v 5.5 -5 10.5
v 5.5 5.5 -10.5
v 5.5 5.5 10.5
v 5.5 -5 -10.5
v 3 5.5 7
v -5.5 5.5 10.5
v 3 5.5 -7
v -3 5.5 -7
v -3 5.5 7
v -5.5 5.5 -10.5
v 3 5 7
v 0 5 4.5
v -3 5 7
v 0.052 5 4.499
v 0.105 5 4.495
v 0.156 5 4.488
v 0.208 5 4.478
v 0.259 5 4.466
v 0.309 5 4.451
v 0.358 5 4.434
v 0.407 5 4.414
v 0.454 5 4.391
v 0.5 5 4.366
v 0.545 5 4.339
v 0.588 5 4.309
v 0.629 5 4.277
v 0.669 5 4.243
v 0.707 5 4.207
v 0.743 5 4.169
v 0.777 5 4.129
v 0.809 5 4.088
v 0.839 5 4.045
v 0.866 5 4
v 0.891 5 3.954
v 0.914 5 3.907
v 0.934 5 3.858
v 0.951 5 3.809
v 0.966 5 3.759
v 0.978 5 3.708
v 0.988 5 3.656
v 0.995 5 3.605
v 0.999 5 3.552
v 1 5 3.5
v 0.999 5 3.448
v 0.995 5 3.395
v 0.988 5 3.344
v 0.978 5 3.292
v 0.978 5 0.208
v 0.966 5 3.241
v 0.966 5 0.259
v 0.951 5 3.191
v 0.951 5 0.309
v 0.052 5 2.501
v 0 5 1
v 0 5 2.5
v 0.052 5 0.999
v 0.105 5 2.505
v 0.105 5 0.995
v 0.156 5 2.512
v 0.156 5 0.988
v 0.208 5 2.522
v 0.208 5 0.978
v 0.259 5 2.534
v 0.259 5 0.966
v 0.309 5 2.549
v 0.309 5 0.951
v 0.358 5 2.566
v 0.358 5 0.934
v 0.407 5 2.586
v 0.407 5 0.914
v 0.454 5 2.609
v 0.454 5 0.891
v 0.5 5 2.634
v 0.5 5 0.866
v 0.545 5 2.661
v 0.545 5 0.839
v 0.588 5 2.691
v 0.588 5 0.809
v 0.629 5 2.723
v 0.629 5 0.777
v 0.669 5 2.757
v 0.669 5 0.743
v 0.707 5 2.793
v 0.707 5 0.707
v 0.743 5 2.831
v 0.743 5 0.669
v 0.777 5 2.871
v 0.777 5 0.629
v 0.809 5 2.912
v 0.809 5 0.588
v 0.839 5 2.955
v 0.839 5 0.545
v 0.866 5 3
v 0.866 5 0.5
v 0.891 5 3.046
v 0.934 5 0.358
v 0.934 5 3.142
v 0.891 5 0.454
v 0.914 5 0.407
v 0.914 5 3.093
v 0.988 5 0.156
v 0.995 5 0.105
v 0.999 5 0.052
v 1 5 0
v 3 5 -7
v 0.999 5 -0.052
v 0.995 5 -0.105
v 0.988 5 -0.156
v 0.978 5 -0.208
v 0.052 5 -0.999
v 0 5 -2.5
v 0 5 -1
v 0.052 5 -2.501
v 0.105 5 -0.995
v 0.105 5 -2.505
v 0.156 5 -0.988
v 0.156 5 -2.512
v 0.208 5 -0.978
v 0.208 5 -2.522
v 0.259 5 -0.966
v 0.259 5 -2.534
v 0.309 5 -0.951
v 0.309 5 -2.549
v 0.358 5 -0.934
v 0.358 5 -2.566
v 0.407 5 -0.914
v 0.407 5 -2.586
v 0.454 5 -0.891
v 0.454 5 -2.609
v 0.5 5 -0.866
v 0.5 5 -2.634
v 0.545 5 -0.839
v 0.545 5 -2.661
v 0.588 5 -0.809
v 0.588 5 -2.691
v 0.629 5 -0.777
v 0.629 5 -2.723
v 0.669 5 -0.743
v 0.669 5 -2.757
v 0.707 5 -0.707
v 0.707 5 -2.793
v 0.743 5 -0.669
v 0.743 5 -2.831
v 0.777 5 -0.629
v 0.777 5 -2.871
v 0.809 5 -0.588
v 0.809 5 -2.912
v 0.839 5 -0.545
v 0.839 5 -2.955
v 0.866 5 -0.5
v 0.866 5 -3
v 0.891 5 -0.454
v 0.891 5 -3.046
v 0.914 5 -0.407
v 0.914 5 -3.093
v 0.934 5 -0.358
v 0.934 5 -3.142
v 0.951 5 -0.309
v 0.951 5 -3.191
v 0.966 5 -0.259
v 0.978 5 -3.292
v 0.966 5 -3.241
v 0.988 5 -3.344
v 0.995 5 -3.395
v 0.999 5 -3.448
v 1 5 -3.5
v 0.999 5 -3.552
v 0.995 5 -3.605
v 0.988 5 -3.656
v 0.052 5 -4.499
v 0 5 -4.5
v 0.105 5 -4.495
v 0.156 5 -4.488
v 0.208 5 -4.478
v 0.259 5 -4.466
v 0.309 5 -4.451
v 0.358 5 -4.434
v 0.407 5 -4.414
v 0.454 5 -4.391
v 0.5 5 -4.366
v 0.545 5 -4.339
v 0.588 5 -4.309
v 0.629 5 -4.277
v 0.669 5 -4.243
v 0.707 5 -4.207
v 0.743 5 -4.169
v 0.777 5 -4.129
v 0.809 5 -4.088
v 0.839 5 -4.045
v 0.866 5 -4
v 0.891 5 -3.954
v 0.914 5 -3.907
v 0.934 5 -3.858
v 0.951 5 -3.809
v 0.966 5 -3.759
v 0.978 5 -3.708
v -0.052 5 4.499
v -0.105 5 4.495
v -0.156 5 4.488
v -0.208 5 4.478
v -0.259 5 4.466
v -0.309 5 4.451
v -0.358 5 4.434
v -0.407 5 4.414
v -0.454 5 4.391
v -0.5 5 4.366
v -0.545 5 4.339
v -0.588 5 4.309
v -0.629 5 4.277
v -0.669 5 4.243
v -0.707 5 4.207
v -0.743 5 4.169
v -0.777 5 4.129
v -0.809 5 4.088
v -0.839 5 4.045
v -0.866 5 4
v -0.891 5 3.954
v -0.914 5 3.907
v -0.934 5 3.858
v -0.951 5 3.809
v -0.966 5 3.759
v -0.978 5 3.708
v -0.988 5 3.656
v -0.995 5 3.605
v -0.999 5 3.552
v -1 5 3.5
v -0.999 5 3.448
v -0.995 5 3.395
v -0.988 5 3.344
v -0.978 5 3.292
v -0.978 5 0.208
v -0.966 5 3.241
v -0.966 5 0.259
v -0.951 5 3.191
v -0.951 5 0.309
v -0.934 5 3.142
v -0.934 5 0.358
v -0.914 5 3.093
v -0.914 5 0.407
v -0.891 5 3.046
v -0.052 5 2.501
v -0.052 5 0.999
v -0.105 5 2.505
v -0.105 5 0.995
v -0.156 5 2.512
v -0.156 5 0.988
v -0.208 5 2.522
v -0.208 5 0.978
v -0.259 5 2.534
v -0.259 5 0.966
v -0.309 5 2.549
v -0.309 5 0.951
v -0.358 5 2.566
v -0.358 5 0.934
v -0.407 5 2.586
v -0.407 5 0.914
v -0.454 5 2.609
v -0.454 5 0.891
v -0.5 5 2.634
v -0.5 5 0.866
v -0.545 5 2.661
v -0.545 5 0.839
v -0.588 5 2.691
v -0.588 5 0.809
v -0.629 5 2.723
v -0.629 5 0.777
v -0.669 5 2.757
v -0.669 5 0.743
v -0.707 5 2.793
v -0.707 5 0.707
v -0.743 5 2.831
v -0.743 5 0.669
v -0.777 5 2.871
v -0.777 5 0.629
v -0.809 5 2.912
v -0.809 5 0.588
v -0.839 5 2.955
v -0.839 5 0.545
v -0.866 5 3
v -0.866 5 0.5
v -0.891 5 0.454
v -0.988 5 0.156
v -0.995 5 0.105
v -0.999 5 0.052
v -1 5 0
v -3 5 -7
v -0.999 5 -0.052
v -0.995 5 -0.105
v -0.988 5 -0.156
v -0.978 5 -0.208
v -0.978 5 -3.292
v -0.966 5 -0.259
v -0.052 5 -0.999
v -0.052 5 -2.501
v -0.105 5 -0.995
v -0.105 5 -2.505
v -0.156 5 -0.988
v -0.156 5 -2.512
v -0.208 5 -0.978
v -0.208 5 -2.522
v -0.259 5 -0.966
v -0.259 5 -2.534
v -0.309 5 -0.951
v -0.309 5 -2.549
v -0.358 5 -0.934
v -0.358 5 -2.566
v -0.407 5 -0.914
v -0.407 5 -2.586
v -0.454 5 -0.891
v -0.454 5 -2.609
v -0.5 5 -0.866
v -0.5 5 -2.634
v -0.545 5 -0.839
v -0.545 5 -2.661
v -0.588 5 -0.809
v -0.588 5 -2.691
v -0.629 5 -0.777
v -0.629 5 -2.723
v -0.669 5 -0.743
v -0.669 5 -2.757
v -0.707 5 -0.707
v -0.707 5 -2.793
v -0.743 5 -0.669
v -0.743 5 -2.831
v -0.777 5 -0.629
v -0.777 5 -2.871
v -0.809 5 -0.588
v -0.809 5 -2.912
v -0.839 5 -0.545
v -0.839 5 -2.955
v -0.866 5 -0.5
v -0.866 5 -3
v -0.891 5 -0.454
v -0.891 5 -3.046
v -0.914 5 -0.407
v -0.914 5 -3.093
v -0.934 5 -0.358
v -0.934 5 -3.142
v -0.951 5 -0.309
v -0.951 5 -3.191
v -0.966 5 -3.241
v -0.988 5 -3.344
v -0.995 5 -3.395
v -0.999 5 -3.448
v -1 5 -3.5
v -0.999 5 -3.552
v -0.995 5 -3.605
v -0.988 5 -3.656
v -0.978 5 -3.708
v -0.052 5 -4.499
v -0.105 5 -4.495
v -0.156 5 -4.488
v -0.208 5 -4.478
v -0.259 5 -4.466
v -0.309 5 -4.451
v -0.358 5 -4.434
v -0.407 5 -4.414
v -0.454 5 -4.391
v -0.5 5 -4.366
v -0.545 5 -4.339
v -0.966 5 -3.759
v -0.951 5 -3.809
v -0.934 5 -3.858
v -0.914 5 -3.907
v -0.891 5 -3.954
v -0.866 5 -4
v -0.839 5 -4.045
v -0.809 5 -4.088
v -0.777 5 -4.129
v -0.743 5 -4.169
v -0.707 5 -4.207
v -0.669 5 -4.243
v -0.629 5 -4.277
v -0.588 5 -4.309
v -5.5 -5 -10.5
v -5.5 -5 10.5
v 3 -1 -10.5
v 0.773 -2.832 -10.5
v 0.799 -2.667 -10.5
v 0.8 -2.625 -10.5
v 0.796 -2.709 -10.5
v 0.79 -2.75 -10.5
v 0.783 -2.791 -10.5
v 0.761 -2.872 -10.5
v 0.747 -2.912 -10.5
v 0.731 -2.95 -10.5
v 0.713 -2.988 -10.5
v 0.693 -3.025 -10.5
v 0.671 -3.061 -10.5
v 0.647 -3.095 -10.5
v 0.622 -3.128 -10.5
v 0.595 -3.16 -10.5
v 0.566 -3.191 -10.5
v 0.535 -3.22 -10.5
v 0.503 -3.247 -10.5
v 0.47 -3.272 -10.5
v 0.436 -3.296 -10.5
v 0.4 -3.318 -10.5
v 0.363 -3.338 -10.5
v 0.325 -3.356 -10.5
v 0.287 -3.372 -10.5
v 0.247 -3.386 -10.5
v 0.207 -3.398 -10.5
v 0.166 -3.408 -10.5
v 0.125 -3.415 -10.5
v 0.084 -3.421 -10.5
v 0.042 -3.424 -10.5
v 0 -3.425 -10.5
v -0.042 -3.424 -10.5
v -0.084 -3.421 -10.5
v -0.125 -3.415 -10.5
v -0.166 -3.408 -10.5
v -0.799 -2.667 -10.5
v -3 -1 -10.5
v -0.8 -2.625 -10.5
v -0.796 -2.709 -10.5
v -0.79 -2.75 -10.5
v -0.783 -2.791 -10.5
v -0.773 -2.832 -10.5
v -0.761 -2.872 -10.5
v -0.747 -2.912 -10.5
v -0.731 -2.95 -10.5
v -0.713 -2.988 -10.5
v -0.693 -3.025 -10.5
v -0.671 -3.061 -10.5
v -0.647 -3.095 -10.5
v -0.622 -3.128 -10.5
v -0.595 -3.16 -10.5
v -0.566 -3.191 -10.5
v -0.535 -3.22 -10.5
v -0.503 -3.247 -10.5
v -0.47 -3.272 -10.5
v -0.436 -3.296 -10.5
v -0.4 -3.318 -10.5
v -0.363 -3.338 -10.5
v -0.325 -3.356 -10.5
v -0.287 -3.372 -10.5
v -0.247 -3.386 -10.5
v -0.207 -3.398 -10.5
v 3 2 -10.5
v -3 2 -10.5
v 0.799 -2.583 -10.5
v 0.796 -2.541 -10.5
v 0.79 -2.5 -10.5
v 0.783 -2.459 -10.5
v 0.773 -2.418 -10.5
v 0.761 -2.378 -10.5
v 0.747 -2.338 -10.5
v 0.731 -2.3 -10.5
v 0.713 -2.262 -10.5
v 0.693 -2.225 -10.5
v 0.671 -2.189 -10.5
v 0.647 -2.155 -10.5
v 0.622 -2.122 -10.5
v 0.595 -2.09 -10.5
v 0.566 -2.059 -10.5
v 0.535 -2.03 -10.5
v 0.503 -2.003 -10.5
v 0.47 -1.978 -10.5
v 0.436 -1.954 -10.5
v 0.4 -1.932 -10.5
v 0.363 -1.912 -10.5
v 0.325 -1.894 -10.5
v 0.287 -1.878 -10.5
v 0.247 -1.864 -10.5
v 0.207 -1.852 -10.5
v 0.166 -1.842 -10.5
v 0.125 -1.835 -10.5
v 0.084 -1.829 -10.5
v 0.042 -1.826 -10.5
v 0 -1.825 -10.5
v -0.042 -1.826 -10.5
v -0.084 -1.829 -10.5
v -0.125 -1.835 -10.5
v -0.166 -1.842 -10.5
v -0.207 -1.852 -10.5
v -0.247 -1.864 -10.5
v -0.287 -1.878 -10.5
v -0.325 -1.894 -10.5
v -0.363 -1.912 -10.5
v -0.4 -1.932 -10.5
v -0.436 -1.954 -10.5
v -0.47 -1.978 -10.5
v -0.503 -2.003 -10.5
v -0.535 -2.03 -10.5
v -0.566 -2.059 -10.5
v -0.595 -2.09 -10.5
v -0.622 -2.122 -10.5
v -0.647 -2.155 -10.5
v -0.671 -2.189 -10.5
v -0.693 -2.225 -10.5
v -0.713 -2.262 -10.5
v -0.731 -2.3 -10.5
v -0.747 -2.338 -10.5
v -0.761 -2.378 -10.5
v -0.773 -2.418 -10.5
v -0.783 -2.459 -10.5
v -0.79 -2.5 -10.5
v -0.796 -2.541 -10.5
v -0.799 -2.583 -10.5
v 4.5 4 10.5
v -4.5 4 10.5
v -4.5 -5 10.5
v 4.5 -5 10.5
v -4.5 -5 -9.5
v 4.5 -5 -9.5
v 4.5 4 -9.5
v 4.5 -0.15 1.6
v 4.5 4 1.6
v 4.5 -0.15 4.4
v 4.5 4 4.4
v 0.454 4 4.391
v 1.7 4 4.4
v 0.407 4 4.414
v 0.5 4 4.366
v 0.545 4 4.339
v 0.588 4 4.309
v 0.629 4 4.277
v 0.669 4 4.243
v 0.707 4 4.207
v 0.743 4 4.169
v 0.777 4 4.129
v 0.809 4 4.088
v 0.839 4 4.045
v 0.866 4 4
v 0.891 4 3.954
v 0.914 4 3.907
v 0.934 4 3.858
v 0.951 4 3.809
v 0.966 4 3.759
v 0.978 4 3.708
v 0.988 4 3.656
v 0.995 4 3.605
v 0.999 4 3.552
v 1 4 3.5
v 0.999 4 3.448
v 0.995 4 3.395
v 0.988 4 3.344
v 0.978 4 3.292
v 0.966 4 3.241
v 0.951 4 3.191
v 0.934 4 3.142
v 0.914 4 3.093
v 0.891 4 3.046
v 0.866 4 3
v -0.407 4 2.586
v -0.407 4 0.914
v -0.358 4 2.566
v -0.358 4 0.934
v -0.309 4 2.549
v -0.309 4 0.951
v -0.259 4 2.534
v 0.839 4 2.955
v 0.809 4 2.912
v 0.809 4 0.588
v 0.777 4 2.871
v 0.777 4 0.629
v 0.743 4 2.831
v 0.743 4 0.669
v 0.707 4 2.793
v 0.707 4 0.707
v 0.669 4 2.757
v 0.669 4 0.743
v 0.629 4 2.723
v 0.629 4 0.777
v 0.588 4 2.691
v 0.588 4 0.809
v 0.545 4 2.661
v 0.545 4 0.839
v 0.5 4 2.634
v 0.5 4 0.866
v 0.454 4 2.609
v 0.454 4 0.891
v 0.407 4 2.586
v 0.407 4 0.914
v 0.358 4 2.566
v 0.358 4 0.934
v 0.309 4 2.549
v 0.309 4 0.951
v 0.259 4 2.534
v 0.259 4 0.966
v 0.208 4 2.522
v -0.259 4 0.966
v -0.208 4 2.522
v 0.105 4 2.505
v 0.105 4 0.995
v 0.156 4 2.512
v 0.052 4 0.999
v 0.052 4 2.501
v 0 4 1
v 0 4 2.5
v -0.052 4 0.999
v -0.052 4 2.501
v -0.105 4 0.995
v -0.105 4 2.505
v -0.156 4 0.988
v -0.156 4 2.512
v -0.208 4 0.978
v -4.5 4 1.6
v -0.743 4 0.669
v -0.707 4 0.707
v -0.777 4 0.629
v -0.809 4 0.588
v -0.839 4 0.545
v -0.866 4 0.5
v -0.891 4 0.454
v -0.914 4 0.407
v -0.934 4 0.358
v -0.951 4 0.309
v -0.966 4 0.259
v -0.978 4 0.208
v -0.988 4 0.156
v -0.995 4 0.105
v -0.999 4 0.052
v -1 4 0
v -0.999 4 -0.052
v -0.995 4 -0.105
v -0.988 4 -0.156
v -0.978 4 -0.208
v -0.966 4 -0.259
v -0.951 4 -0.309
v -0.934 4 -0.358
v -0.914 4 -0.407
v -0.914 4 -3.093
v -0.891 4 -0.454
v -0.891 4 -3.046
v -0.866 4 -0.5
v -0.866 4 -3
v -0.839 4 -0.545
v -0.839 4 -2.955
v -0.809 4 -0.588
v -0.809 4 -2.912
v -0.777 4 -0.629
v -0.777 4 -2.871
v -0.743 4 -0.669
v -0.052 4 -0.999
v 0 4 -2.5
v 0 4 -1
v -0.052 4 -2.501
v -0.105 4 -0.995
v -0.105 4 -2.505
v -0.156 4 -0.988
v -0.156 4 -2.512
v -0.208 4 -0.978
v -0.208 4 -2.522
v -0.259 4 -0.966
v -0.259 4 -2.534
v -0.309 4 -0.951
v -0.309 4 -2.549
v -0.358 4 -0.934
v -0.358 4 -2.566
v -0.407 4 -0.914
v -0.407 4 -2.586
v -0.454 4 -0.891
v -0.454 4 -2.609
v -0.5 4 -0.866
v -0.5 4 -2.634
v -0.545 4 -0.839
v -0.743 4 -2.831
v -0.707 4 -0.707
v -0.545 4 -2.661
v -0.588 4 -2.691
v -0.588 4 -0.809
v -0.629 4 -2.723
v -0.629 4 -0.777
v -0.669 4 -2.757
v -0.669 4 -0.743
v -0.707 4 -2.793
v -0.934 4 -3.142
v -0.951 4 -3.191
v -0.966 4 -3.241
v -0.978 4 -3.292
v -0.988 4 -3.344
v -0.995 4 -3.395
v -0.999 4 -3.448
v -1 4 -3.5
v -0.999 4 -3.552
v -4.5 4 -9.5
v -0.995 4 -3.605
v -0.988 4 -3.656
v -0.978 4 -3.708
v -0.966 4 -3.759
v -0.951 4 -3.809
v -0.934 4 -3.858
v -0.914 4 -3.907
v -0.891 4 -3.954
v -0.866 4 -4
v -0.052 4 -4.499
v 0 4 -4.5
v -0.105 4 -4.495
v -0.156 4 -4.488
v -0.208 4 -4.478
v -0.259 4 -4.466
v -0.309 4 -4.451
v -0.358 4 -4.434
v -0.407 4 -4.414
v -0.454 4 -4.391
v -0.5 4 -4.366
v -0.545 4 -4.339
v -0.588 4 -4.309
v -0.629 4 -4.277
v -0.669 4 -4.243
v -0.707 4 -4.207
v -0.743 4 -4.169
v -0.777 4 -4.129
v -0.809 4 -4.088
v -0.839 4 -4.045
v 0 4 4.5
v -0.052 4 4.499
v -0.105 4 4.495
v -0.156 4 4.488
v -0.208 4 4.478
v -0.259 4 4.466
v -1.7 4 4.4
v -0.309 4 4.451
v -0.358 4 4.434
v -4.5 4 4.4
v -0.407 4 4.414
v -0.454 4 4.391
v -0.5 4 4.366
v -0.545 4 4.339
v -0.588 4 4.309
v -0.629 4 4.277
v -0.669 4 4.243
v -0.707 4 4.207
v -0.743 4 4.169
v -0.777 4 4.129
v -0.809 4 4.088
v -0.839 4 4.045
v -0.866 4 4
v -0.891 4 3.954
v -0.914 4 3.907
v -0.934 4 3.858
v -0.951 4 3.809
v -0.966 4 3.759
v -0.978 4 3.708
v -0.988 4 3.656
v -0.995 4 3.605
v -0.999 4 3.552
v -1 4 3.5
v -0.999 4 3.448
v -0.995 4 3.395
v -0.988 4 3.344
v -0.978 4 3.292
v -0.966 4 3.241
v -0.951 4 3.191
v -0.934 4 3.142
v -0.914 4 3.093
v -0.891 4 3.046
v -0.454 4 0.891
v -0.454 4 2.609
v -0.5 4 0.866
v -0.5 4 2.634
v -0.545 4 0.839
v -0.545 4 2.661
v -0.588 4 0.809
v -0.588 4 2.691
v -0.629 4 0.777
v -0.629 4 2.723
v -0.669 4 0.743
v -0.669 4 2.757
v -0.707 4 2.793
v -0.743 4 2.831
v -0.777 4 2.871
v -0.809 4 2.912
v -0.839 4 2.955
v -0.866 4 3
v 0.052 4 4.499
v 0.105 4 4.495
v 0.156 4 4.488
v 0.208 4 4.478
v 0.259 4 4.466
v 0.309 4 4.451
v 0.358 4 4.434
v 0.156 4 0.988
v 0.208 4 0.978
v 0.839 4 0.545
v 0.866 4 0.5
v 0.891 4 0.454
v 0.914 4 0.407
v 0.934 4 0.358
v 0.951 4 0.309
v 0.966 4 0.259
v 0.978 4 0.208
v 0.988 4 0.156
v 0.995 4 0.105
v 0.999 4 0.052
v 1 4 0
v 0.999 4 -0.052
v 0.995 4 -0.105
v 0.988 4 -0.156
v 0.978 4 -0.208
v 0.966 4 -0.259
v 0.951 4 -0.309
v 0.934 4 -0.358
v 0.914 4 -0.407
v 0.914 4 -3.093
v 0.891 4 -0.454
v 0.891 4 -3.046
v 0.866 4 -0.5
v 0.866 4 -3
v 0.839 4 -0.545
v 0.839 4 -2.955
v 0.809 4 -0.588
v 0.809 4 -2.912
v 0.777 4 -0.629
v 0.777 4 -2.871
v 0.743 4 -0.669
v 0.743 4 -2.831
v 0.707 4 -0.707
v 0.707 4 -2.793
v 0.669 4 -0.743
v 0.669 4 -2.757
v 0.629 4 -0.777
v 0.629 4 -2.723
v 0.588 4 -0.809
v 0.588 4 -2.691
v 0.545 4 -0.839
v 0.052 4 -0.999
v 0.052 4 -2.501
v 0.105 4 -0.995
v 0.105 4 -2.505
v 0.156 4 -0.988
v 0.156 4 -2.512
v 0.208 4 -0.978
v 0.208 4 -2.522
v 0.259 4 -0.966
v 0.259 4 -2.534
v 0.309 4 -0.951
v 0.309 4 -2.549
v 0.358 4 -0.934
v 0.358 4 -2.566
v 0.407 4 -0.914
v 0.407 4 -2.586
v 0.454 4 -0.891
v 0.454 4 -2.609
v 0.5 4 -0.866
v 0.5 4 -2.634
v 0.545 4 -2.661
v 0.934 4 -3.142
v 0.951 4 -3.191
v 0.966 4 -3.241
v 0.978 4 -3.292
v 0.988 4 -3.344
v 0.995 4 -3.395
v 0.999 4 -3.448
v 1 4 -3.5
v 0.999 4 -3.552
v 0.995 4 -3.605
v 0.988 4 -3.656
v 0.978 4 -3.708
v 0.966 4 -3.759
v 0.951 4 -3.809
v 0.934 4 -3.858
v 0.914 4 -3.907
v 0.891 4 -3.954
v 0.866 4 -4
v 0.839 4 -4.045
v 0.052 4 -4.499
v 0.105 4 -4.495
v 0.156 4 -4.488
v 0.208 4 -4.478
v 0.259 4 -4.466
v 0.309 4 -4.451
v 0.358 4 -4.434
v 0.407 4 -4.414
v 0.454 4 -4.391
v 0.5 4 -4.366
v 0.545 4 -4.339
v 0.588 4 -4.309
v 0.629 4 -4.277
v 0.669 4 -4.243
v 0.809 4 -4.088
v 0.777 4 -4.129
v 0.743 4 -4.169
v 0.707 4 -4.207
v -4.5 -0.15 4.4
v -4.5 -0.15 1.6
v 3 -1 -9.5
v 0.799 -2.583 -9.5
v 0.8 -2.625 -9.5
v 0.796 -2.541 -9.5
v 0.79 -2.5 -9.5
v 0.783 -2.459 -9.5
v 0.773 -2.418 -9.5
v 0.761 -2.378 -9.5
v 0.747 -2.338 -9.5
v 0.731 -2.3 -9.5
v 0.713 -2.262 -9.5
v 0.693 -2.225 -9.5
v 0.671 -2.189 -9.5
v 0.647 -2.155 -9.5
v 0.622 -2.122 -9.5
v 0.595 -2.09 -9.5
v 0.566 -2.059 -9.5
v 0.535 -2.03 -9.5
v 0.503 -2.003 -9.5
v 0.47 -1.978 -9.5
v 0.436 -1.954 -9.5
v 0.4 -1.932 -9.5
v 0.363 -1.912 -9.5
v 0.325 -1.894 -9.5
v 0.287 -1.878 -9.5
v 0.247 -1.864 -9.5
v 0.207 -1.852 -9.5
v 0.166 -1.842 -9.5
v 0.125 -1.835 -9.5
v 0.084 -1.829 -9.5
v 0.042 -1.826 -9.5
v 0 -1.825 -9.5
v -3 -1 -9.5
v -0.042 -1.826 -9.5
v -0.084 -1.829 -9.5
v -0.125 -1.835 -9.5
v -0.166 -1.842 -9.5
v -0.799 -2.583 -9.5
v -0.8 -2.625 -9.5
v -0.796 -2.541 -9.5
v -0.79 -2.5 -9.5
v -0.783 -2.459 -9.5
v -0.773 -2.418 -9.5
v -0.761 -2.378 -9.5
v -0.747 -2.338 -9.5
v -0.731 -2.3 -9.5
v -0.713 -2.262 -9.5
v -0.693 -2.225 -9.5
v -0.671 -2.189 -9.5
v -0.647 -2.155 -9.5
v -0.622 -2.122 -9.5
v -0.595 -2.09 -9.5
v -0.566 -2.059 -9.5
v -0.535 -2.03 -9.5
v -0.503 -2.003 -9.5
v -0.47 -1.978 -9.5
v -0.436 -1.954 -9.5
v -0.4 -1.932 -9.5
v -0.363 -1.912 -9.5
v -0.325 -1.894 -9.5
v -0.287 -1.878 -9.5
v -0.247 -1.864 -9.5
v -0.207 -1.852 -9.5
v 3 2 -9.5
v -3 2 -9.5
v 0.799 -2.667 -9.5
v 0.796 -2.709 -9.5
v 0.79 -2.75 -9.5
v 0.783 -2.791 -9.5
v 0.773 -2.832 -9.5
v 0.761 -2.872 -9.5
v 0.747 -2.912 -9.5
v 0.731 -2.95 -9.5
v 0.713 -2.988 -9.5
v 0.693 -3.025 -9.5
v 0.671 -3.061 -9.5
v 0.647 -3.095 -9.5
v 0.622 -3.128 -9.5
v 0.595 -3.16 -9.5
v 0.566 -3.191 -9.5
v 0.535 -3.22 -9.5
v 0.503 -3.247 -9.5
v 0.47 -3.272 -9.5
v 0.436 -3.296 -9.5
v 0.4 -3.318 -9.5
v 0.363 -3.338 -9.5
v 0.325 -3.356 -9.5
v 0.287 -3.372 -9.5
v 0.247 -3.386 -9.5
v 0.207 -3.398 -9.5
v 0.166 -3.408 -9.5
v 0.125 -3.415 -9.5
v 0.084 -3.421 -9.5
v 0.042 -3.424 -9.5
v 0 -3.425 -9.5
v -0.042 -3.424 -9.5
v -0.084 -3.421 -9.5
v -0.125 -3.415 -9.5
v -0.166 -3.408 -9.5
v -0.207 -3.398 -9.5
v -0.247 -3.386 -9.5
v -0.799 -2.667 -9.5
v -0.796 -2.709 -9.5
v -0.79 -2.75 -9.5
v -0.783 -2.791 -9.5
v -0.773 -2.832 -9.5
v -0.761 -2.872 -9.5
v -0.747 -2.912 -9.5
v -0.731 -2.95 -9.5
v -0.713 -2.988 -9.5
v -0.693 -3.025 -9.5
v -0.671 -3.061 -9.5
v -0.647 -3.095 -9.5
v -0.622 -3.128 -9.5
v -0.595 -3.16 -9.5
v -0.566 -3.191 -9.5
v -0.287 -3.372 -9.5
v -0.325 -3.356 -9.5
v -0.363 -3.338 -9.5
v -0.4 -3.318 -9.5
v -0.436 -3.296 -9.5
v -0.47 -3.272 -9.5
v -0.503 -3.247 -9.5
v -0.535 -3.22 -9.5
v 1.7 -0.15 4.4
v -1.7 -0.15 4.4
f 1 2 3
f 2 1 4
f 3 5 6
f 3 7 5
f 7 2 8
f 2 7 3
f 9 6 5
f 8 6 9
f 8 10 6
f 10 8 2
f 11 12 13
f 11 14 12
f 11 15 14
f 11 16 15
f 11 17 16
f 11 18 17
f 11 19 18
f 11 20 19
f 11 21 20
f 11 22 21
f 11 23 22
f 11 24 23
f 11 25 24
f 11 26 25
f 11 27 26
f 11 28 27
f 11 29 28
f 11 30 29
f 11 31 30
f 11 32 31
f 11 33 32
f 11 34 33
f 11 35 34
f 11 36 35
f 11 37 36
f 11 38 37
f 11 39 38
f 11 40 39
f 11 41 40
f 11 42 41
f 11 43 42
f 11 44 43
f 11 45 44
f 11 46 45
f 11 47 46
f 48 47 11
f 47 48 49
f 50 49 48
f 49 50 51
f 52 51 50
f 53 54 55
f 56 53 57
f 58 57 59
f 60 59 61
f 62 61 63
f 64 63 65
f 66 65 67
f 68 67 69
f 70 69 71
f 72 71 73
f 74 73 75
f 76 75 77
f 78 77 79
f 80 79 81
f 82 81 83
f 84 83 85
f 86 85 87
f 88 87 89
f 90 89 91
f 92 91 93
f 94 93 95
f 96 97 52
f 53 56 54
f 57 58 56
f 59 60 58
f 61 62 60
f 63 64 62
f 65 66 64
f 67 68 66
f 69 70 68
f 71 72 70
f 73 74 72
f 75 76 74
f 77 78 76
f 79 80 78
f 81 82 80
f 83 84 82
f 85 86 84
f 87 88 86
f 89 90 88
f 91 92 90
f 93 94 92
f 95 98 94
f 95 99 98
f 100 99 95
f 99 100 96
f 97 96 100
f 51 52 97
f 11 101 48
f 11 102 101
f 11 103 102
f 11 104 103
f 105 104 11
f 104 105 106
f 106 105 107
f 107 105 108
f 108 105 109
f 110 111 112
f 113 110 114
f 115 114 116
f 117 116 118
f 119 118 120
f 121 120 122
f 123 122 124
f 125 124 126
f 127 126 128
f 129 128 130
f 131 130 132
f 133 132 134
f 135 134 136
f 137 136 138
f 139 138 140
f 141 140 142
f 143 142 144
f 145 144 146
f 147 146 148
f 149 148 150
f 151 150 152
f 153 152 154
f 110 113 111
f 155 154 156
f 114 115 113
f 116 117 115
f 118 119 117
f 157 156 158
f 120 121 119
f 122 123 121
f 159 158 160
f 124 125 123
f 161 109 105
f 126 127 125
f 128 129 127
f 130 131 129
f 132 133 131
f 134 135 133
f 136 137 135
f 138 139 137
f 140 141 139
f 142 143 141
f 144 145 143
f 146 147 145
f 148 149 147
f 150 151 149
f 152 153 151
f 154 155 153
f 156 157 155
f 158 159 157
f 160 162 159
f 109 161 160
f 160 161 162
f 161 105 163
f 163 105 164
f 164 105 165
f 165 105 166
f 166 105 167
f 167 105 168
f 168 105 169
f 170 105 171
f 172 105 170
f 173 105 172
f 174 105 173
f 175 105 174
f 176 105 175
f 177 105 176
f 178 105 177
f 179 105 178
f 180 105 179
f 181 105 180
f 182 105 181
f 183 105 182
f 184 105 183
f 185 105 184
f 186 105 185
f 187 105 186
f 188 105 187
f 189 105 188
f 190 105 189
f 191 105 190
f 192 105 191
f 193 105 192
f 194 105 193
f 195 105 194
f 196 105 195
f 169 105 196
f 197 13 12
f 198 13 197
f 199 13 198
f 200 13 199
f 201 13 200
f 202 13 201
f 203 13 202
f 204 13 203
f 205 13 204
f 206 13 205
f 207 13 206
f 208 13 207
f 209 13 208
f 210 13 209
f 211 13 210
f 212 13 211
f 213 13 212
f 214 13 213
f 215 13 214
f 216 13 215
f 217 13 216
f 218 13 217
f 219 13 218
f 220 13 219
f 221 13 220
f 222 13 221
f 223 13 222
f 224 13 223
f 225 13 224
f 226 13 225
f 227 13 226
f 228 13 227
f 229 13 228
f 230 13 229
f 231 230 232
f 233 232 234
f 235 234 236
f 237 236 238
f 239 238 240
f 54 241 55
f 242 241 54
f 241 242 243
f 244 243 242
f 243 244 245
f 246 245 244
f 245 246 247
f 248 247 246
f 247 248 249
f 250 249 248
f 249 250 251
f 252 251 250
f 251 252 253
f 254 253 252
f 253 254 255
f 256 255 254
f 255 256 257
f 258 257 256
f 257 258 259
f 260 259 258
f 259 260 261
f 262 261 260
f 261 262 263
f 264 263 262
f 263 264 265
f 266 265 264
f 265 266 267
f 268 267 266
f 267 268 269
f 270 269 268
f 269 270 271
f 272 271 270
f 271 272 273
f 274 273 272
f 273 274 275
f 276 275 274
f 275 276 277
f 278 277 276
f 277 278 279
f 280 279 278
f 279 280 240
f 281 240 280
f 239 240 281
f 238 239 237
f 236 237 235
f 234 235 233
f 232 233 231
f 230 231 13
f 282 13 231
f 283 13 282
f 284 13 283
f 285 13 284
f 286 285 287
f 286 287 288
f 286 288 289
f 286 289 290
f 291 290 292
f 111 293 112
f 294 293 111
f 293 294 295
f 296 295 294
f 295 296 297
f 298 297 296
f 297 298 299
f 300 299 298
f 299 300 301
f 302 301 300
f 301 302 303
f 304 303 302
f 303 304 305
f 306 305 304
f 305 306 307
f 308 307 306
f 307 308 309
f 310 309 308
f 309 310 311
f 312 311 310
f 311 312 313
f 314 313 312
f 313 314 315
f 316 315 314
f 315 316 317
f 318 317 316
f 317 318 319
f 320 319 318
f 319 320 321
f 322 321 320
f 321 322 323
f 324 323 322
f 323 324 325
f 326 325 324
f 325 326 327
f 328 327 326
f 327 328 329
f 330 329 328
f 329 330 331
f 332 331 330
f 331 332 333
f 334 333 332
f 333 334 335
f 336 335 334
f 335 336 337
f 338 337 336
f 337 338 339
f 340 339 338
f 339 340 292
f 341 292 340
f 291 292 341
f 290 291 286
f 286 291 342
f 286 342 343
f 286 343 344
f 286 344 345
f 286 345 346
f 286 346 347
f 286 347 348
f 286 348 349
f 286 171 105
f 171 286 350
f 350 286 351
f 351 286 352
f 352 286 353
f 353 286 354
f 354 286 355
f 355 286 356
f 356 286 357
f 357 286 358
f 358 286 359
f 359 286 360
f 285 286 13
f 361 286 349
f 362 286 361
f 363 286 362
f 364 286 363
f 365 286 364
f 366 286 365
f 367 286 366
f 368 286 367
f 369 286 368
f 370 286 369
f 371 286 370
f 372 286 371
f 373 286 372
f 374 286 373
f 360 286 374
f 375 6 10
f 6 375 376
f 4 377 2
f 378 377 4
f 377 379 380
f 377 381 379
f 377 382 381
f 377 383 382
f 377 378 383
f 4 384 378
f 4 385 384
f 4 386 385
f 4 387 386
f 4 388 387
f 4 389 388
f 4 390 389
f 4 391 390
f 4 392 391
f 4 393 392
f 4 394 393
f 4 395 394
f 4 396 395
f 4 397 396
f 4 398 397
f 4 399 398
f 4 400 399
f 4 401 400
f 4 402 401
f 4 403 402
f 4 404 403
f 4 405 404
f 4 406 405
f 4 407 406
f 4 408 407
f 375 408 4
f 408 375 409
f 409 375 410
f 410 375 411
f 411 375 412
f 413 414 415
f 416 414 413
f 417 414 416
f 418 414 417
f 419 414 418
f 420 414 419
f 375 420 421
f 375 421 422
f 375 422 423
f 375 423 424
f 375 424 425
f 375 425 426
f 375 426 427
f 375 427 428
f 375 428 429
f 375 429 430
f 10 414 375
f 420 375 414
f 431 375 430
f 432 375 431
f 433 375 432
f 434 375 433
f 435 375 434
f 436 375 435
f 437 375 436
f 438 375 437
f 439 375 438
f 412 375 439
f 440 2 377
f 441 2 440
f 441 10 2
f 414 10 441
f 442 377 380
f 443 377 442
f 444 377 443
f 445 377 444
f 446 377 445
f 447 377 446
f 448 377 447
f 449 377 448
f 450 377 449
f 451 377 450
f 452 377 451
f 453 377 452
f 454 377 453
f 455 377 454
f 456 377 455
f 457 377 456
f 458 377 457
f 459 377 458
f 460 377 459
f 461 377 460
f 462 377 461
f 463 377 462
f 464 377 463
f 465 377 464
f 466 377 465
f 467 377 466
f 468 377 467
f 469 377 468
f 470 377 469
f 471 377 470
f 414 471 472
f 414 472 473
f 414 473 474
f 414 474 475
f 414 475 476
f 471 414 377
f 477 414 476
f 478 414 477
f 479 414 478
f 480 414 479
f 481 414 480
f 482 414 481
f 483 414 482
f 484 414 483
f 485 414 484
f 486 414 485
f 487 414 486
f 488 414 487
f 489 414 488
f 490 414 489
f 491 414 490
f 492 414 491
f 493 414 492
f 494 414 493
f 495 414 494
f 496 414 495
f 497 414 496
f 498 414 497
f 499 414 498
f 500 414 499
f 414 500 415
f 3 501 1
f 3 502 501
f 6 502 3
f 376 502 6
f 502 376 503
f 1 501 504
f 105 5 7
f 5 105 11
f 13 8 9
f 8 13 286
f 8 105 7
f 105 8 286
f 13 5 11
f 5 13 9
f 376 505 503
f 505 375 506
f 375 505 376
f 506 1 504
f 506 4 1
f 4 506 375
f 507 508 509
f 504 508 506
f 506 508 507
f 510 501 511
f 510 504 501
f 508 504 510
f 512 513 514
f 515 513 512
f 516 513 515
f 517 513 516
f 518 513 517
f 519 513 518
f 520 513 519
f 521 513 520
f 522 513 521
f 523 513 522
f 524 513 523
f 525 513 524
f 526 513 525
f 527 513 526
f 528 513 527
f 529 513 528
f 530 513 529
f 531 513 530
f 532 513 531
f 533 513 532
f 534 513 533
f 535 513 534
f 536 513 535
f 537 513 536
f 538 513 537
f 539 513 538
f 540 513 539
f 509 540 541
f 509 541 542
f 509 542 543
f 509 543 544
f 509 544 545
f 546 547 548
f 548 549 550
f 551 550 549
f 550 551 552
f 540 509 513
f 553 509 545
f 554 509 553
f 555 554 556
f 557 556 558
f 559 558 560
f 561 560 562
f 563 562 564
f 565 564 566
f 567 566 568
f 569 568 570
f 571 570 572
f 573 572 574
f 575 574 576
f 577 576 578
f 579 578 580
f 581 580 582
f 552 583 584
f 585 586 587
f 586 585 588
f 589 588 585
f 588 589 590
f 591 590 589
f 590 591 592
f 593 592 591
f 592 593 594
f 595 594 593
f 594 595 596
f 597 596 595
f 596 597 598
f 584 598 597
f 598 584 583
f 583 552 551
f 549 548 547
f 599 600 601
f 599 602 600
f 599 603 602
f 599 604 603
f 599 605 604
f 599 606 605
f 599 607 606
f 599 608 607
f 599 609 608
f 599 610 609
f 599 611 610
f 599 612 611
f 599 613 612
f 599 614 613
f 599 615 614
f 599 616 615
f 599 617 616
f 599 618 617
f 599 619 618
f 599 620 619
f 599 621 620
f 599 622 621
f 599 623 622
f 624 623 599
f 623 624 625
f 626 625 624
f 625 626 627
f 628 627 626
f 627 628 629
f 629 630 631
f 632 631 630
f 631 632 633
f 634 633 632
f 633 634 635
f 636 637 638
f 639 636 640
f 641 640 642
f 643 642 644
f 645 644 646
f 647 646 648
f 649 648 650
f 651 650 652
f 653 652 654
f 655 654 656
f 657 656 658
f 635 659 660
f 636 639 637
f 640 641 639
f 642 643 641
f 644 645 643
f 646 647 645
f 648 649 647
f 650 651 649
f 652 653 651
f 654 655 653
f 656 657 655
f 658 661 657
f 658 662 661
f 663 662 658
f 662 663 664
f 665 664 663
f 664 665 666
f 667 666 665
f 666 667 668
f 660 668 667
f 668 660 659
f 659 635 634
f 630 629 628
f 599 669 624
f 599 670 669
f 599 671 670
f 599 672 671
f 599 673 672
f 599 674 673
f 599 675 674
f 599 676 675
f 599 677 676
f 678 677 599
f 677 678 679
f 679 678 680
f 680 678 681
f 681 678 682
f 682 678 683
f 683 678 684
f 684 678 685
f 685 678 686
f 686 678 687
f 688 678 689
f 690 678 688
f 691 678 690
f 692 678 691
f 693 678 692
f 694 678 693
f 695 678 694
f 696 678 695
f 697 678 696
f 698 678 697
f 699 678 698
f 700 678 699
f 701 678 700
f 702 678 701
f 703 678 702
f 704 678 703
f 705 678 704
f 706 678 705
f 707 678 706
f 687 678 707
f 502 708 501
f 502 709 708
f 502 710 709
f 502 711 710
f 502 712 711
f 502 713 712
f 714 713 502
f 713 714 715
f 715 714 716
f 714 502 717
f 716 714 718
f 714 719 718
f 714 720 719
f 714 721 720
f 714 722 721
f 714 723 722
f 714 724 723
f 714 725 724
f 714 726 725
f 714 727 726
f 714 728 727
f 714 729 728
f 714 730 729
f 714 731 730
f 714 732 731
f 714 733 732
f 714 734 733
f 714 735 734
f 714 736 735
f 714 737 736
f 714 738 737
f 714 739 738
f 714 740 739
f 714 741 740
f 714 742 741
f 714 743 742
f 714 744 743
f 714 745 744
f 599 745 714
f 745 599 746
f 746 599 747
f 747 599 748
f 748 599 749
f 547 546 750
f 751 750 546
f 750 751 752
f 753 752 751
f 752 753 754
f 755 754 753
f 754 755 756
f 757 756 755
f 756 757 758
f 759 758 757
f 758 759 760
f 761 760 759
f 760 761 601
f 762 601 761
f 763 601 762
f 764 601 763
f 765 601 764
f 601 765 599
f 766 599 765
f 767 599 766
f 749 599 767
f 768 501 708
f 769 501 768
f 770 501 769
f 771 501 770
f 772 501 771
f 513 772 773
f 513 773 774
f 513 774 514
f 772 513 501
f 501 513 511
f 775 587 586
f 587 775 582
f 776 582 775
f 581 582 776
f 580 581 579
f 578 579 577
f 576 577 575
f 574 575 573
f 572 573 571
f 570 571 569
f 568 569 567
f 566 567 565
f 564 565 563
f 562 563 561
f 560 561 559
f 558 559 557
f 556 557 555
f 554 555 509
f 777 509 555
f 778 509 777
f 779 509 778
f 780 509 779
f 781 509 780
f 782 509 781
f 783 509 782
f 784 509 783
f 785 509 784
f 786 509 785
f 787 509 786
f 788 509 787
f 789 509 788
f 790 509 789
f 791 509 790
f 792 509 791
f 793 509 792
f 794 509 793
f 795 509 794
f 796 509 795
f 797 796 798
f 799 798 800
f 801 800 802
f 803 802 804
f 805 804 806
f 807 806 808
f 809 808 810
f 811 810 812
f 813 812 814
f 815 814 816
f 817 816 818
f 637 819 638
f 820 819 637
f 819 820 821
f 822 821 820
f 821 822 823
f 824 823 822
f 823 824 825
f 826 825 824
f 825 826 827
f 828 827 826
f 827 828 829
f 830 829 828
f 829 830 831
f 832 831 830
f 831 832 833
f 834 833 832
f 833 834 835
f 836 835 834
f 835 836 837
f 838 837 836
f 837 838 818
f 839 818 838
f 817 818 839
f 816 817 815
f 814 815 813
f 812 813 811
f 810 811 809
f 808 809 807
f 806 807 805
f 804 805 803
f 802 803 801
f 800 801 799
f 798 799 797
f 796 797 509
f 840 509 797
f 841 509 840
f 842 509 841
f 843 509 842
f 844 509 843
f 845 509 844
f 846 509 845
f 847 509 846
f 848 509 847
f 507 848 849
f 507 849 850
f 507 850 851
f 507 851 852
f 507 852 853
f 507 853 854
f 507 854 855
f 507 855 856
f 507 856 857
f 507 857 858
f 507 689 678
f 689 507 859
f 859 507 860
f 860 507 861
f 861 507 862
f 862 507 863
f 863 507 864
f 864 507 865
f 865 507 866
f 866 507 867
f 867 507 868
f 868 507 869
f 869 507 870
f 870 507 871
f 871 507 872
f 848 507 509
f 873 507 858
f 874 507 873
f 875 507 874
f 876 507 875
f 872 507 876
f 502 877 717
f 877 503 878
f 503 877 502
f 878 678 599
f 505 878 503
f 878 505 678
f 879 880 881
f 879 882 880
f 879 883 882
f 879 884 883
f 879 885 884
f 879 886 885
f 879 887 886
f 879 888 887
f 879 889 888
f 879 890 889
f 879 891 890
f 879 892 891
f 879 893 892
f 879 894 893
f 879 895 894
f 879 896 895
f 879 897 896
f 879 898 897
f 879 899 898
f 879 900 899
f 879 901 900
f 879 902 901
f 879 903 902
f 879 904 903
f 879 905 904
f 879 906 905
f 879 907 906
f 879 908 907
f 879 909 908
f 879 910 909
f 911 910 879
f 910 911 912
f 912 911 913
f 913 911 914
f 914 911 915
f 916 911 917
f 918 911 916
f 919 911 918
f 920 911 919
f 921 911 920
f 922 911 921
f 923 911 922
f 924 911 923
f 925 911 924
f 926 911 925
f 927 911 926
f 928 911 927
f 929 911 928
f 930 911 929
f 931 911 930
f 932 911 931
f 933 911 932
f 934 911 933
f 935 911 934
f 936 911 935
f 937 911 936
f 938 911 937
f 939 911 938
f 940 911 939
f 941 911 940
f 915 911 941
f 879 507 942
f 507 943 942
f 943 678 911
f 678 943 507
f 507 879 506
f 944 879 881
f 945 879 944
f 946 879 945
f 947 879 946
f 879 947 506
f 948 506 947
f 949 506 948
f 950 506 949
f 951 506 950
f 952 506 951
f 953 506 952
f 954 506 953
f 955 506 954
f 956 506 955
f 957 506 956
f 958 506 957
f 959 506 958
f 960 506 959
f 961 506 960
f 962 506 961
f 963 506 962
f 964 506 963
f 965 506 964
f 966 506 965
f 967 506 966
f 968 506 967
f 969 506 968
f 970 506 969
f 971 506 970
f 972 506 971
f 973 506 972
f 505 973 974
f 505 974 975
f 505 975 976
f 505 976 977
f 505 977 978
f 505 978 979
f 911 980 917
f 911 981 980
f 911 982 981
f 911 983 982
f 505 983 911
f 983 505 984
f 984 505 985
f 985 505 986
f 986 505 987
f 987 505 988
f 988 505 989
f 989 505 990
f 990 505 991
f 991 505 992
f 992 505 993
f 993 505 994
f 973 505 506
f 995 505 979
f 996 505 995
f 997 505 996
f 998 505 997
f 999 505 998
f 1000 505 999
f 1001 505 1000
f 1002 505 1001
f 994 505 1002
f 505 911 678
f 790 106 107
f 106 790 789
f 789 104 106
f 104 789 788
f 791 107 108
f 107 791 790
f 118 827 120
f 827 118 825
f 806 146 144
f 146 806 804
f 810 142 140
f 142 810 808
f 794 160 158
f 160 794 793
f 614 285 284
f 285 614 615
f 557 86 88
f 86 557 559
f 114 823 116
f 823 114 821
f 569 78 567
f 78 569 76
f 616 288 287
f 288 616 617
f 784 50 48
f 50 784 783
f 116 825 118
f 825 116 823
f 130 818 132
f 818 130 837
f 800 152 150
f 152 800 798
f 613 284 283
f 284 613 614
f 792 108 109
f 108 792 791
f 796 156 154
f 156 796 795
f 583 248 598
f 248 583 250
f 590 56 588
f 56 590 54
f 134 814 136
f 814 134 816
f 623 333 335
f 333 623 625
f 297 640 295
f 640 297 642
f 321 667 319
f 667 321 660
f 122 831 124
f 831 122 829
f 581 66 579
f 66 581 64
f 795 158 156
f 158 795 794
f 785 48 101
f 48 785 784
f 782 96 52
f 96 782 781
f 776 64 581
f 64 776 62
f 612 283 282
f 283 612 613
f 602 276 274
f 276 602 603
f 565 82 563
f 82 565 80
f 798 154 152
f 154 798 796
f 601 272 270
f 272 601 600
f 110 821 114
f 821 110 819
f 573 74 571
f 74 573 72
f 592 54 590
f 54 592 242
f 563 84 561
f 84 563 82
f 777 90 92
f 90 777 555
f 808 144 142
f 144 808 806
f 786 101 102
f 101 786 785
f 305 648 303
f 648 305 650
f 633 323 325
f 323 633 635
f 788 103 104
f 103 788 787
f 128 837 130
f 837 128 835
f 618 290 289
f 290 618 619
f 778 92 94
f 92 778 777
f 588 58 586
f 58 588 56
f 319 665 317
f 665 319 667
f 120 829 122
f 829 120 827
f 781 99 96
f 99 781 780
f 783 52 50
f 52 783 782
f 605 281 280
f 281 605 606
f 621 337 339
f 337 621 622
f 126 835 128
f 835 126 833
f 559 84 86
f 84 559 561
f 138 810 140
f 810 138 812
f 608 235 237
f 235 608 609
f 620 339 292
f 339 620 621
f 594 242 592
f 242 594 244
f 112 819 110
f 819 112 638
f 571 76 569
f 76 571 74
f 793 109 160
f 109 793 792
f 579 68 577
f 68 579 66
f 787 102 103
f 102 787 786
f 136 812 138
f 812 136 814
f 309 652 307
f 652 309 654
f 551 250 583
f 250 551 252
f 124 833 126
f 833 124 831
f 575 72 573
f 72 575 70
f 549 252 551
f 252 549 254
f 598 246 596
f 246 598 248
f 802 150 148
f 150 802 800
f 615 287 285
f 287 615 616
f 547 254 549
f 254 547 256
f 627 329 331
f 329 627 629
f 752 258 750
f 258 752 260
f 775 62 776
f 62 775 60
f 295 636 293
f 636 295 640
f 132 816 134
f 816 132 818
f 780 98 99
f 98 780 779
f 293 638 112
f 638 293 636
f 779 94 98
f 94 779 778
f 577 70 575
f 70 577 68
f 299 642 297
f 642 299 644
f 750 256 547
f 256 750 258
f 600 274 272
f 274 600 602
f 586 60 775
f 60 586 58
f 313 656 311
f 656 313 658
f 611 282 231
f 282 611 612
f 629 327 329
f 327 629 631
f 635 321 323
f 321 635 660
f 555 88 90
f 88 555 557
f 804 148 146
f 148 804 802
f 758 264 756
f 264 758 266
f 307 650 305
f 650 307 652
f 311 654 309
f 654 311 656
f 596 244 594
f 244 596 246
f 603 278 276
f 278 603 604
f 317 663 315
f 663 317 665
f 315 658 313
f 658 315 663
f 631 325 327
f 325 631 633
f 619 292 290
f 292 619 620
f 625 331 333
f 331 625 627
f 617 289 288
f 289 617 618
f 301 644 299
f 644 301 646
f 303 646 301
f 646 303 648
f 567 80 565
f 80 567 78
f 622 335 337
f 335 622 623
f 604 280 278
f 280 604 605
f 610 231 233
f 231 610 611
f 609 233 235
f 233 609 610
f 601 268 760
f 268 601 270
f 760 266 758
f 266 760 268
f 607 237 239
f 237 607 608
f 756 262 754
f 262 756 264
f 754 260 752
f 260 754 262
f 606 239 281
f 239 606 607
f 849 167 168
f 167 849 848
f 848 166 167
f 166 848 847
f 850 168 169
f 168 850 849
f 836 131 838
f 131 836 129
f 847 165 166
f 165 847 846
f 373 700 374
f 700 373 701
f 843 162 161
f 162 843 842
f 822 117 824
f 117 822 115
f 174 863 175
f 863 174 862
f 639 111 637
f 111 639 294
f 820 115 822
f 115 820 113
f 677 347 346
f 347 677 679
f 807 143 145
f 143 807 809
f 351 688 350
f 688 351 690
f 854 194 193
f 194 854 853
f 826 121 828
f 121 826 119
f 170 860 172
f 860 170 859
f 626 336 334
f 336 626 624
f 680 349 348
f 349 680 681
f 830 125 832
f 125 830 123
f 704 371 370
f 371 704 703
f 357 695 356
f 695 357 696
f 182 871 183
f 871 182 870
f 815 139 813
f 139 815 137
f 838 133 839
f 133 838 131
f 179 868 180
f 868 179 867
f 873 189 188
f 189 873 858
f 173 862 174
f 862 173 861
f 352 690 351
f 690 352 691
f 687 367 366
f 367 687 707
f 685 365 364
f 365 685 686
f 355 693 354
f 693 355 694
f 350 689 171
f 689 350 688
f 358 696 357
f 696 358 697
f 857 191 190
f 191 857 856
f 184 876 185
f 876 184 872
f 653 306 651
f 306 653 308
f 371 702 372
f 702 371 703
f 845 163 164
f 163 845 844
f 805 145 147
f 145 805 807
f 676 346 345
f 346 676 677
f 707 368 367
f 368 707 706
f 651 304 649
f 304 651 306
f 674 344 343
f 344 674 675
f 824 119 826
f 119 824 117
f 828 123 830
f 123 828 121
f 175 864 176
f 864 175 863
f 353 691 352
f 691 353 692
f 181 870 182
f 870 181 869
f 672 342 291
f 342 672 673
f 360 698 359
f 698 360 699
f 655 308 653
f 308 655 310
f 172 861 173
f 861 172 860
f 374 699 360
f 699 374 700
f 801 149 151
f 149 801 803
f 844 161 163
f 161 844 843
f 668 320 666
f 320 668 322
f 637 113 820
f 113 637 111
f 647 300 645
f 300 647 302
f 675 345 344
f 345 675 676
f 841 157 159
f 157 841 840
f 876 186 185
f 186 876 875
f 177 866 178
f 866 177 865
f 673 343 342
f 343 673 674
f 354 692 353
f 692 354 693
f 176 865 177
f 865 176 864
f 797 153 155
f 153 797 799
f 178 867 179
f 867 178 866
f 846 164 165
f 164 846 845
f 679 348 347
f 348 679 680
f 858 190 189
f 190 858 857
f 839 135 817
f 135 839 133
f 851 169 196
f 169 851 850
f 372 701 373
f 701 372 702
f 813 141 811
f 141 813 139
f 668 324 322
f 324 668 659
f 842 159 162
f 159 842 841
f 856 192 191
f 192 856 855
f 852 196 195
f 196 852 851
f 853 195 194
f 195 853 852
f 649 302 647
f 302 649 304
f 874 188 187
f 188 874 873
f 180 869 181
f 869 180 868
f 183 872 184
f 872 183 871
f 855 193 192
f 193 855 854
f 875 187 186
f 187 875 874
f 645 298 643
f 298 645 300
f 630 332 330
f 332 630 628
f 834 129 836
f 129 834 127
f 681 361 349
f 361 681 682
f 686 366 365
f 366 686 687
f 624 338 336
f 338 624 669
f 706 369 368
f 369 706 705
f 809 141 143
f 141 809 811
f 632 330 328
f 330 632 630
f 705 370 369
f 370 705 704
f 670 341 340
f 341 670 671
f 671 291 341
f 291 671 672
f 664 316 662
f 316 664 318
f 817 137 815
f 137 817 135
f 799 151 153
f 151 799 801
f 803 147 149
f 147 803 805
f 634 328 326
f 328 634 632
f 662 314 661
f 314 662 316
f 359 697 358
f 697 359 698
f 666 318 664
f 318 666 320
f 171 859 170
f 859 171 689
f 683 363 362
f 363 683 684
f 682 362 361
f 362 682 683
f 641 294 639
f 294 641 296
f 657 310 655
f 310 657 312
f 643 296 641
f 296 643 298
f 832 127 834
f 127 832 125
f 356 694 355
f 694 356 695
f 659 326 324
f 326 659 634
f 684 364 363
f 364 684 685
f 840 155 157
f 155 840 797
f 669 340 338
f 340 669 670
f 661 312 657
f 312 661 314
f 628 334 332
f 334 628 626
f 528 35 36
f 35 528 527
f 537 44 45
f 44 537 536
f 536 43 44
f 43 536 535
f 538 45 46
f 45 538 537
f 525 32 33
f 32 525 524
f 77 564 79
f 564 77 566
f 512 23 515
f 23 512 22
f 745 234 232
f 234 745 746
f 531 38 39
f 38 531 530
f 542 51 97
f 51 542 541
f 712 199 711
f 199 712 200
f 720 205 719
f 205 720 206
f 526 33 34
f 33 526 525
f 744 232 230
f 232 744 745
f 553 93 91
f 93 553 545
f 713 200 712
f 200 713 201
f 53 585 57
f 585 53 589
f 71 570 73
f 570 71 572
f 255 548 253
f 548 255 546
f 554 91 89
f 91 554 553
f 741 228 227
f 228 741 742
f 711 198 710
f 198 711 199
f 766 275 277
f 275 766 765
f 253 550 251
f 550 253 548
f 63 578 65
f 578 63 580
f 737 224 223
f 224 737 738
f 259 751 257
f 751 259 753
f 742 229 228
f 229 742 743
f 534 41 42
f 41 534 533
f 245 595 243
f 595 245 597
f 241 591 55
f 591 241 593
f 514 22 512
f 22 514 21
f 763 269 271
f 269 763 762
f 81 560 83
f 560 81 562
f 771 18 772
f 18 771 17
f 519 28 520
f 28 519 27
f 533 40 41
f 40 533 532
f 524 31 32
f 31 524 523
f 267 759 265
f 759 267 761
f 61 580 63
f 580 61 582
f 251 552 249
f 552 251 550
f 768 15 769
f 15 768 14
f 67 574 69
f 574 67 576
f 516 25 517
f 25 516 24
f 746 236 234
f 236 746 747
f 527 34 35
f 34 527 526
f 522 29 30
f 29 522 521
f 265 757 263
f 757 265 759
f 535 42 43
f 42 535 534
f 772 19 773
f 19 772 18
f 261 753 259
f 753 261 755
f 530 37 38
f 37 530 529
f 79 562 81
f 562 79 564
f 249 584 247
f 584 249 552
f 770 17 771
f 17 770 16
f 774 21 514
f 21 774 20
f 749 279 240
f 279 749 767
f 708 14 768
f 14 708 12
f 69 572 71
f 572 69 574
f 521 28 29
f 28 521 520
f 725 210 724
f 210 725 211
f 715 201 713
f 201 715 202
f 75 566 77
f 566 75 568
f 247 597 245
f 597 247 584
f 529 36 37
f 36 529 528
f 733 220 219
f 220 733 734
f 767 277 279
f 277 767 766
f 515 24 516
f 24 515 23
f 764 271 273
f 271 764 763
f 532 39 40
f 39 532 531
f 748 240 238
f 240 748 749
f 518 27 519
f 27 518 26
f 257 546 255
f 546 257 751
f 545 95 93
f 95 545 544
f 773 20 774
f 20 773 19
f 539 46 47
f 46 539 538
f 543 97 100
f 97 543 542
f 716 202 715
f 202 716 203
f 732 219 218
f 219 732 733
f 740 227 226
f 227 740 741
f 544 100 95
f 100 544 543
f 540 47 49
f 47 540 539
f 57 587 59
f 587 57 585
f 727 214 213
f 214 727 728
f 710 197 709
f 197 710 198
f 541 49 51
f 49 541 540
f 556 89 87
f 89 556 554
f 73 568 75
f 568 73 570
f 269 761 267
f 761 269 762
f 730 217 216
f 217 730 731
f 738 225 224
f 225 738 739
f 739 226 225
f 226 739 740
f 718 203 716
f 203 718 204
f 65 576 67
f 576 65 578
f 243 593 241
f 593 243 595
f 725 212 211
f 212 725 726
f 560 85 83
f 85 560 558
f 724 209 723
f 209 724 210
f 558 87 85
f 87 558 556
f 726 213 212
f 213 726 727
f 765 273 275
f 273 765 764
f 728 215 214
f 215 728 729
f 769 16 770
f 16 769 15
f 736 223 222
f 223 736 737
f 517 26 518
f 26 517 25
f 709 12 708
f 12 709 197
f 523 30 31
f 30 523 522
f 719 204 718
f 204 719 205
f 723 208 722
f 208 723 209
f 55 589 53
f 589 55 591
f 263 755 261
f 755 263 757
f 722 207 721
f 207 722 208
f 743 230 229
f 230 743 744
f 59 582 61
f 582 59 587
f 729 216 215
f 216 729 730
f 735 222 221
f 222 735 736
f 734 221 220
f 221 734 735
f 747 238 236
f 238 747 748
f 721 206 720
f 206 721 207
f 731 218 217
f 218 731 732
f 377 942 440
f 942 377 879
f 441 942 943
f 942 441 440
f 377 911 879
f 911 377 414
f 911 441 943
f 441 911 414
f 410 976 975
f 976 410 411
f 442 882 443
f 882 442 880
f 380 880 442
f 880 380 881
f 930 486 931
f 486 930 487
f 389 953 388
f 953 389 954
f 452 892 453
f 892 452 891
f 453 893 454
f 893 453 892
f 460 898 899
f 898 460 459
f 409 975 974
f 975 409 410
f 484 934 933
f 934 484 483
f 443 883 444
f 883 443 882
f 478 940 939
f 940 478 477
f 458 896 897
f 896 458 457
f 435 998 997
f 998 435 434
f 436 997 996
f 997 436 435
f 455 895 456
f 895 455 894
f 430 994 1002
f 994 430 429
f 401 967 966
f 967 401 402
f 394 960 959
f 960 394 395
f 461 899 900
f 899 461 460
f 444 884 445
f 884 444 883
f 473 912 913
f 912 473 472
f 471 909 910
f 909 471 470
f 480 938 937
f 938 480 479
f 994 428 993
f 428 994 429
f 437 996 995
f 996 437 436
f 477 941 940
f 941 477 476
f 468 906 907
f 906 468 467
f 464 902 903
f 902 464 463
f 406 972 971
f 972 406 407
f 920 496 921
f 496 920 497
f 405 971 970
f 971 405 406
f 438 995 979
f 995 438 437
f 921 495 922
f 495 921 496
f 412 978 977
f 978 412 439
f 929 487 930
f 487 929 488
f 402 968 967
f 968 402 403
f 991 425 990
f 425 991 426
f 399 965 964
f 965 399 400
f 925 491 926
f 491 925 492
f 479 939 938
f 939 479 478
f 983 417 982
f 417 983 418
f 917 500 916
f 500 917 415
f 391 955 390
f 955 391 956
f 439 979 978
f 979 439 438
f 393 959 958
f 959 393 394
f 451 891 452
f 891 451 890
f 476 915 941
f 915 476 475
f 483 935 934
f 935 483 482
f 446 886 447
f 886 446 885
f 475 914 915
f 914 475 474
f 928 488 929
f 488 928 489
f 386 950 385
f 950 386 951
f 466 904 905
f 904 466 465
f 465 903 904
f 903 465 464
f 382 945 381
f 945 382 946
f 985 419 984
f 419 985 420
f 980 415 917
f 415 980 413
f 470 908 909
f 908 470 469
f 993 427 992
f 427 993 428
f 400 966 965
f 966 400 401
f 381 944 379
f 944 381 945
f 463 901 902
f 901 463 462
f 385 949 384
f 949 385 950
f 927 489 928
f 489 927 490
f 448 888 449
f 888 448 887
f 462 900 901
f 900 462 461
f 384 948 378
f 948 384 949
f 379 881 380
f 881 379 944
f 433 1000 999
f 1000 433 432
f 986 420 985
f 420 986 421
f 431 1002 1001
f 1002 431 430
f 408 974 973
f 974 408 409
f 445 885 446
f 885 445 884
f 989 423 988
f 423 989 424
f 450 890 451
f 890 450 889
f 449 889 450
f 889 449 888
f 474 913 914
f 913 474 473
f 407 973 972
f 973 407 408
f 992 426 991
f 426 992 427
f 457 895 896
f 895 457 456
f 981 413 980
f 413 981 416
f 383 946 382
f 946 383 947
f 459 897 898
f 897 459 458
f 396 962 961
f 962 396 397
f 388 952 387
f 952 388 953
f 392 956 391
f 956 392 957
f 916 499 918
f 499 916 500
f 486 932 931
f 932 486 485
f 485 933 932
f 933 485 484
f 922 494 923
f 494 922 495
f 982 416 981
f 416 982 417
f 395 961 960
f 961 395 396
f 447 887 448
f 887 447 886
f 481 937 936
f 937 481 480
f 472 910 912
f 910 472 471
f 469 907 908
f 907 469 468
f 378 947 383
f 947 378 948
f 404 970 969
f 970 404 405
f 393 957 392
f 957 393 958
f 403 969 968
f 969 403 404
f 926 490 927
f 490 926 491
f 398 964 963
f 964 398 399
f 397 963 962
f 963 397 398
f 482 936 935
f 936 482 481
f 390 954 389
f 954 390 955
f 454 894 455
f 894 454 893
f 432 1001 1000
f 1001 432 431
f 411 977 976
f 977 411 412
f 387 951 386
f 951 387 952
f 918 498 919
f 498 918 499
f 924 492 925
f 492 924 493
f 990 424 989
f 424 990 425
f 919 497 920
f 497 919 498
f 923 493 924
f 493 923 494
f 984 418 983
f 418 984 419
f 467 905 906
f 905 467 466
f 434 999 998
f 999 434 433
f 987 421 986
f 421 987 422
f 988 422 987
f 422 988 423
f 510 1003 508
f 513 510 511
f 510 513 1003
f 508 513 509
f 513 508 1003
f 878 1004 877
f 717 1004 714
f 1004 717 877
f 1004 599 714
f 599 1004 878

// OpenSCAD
$fn=120;


module pcb()
{
  color("Green") cube([8.75,18.75,0.8], center=true);
  translate([0,(18.75-2.4)/2,(0.8+4.3)/2]) switch();
}

module switch()
{
  color("Grey") 
  {
    cube([6.9,2.4,4.3], center=true);
    cube([3,3.5,1.5], center=true);
  }
}


module inside()
{
  color("Purple") cube([10,16,8], center=true);
}


module screw_holes(radius=1.25)
{
  rotate([0,0,180]) translate([6,(21-3.)/2,0]) cylinder(h=10,r=radius,center=true);
  rotate([0,0,180]) translate([-6,(21-3.)/2,0]) cylinder(h=10,r=radius,center=true);
  translate([6,(21-3.)/2,0]) cylinder(h=10,r=radius,center=true);
  translate([-6,(21-3.)/2,0]) cylinder(h=10,r=radius,center=true);
}


module top()
{
  difference()
  {
    union()
    {
      // PCB is ~9 by ~19 
      cube([11,21,10], center=true);
      translate([0,0,5.5])
      {
        // Top with boarder cut-out
        difference()
        {
          translate([0,0,-0.25]) cube([11,21,0.5], center=true);
          cube([6,14,2], center=true);
        }
      }

    }
    translate([0,-1,-1]) cube([9,21,10], center=true);

    // Light holes
    translate([0,0,5]) cylinder(h=5,r=1.0,center=true);
    translate([0,3.5,5])  cylinder(h=5,r=1.0,center=true);
    translate([0,-3.5,5]) cylinder(h=5,r=1.0,center=true);
    // Button hole
#    translate([0,10,0.5]) cube([6,5,3], center=true);
    // Base holes for screws
    translate([-1,-1,1])  translate([1,-(3-21)/2,(-10+2.75)/2]) rotate([90,0,0]) cylinder(h=10,r=0.8,center=true);
//    mirror([1,0,0]) translate([-1,-1,1])  translate([(11-2.5)/2,-(3-21)/2,(-10+2.75)/2]) rotate([90,0,0]) cylinder(h=10,r=0.6,center=true);

   
  }

 
  // Part with holes to screw into
//  side_hole_supports();
//  mirror([1,0,0]) side_hole_supports();

  // Side arms to support pcb step-out
  side_arms();
  mirror([1,0,0]) side_arms();
}


module side_hole_supports()
{
  // Move into the case by 1 mm
  translate([-1,1,1]) 
  translate([(11-2.5)/2,(5-21)/2,(-10+2.75)/2]) difference()
  {
    translate([-0,0,0])  cube([3,5,2.75], center=true);
    translate([0,0,0]) rotate([0,0,45]) translate([0,5,0]) cube([3*2,5*2,2.75*2], center=true);
    rotate([90,0,0]) cylinder(h=10,r=0.6,center=true);
  }
}


module base_holes_support()
{
  // Part with holes to screw into - at base
  translate([-1,-1,1])  translate([(11-2.5)/2,-(3-21)/2,(-10+2.75)/2]) difference()
  {
    cube([3,3,2.75], center=true);
    rotate([90,0,0]) cylinder(h=10,r=0.6,center=true);
  }
}


module side_arms()
{
  // Side arms to support pcb step-out
#  translate([(12-4.3)/2,-2.25,2]) difference()
  {
    translate([-0.5,0,0])  cube([3.8,4.3,4.3], center=true);
    rotate([0,0,45]) translate([0,4.3,0]) cube([4.3*2,4.3*2,4.3*2], center=true);
//    translate([3.8,0,0])  cube([4.3,4.3*2,4.3*2], center=true);

  }
}


module cuffend_oneside()
{
  difference()
  {
    translate([7.5,-.8,0]) rotate([90,0,0]) cylinder(h=2.5, r=10, center=true);
     // +0.1 to make sure manifold
    translate([17.5*2+0.1,-1.,0]) cube([17.5*4,5,17.5*4], center=true);
  }
}

module cuffend()
{
  union()
  {
    cuffend_oneside();
    mirror([1,0,0]) cuffend_oneside();
  }
}


module bottom_()
{
  // base is "squeezed" by brim 
  scale([1, 1.,1])  difference()
  {
    union()
    {
      // scale as bottom is not rotated
      hull()
      {
        translate([0,-0.5,0]) cube([9,20,0.8], center=true);
        translate([0,0,0.8]) cube([6,6,0.8], center=true);
      }
      // End Wall (l-shape)
      translate([0,-10.1,-9/2]) rotate([5,0,0])cube([9,0.8,9+0.8], center=true);
      // Other end with hole to screw into
      translate([0,9-1,-1.5]) cube([9,3,3], center=true);
      translate([0,0,0.8])
      {
        translate([0,0,(15+0.8)/2]) cylinder(h=15,r=1.5,center=true);
        translate([0,0,0.8]) cylinder(h=1,r1=3, r2=1.5,center=true);
        translate([0,0,15-0.8]) cylinder(h=1,r1=1.2, r2=2.5,center=true);
      }
      difference()
      {
          rotate([0,0,30]) translate([0,0,(15+0.8)])  cube([25,5,2.5	], center=true);
//          translate([0,0,(15+0.8)]) rotate([-90,0,90])  cuffend();
          translate([9,0,(15+1)])  cube([9,5*5,3*2], center=true);
          translate([-9,0,(15+1)])  cube([9,5*5,3*2], center=true);
      }


    }
   // Screw holes 
#  translate([0,10,-1.75]) rotate([90,0,0])  cylinder(h=10,r=0.8,center=true);


//Cruft
//#  translate([3.25,0,-1.75]) rotate([90,0,0])  cylinder(h=40,r=0.6,center=true);
//#  translate([-3.25,0,-1.75]) rotate([90,0,0])  cylinder(h=40,r=0.6,center=true);
//  translate([0,0,0]) screw_holes(radius=0.8);
//  translate([-1,-1,1])  translate([(11-2.5)/2,(3-21)/2,(-10+2.75)/2]) rotate([90,0,0]) cylinder(h=10,r=0.6,center=true);
//  mirror([1,0,0])   translate([-1,-1,1])  translate([(11-2.5)/2,(3-21)/2,(-10+2.75)/2]) rotate([90,0,0]) cylinder(h=10,r=0.6,center=true);

  }
}



module button()
{
  rotate([-90,0,0]) color("Blue") 
  {
    cube([8,4,0.25], center=true);
    translate([0,0,(5-0.25)/2])  cube([5,2,5], center=true);
  }

}

difference()
{
  union()
  {
   top();
//   translate([0,0,-6])  rotate([180,0,180]) bottom_();
   translate([0,0,-4.6])  rotate([180,0,180]) color("Grey") bottom_();
   translate([0,0,-0.75]) pcb();
   translate([0,10.,1])  button();
  }
//  translate([0,-50,-50]) cube([100,100,100]);
  translate([0,-0,-50]) cube([100,100,100]);
}


!rotate([-90,0,0]) top();
//!rotate([-90,90,0])  bottom_();
//!rotate([90,0,0]) button();
